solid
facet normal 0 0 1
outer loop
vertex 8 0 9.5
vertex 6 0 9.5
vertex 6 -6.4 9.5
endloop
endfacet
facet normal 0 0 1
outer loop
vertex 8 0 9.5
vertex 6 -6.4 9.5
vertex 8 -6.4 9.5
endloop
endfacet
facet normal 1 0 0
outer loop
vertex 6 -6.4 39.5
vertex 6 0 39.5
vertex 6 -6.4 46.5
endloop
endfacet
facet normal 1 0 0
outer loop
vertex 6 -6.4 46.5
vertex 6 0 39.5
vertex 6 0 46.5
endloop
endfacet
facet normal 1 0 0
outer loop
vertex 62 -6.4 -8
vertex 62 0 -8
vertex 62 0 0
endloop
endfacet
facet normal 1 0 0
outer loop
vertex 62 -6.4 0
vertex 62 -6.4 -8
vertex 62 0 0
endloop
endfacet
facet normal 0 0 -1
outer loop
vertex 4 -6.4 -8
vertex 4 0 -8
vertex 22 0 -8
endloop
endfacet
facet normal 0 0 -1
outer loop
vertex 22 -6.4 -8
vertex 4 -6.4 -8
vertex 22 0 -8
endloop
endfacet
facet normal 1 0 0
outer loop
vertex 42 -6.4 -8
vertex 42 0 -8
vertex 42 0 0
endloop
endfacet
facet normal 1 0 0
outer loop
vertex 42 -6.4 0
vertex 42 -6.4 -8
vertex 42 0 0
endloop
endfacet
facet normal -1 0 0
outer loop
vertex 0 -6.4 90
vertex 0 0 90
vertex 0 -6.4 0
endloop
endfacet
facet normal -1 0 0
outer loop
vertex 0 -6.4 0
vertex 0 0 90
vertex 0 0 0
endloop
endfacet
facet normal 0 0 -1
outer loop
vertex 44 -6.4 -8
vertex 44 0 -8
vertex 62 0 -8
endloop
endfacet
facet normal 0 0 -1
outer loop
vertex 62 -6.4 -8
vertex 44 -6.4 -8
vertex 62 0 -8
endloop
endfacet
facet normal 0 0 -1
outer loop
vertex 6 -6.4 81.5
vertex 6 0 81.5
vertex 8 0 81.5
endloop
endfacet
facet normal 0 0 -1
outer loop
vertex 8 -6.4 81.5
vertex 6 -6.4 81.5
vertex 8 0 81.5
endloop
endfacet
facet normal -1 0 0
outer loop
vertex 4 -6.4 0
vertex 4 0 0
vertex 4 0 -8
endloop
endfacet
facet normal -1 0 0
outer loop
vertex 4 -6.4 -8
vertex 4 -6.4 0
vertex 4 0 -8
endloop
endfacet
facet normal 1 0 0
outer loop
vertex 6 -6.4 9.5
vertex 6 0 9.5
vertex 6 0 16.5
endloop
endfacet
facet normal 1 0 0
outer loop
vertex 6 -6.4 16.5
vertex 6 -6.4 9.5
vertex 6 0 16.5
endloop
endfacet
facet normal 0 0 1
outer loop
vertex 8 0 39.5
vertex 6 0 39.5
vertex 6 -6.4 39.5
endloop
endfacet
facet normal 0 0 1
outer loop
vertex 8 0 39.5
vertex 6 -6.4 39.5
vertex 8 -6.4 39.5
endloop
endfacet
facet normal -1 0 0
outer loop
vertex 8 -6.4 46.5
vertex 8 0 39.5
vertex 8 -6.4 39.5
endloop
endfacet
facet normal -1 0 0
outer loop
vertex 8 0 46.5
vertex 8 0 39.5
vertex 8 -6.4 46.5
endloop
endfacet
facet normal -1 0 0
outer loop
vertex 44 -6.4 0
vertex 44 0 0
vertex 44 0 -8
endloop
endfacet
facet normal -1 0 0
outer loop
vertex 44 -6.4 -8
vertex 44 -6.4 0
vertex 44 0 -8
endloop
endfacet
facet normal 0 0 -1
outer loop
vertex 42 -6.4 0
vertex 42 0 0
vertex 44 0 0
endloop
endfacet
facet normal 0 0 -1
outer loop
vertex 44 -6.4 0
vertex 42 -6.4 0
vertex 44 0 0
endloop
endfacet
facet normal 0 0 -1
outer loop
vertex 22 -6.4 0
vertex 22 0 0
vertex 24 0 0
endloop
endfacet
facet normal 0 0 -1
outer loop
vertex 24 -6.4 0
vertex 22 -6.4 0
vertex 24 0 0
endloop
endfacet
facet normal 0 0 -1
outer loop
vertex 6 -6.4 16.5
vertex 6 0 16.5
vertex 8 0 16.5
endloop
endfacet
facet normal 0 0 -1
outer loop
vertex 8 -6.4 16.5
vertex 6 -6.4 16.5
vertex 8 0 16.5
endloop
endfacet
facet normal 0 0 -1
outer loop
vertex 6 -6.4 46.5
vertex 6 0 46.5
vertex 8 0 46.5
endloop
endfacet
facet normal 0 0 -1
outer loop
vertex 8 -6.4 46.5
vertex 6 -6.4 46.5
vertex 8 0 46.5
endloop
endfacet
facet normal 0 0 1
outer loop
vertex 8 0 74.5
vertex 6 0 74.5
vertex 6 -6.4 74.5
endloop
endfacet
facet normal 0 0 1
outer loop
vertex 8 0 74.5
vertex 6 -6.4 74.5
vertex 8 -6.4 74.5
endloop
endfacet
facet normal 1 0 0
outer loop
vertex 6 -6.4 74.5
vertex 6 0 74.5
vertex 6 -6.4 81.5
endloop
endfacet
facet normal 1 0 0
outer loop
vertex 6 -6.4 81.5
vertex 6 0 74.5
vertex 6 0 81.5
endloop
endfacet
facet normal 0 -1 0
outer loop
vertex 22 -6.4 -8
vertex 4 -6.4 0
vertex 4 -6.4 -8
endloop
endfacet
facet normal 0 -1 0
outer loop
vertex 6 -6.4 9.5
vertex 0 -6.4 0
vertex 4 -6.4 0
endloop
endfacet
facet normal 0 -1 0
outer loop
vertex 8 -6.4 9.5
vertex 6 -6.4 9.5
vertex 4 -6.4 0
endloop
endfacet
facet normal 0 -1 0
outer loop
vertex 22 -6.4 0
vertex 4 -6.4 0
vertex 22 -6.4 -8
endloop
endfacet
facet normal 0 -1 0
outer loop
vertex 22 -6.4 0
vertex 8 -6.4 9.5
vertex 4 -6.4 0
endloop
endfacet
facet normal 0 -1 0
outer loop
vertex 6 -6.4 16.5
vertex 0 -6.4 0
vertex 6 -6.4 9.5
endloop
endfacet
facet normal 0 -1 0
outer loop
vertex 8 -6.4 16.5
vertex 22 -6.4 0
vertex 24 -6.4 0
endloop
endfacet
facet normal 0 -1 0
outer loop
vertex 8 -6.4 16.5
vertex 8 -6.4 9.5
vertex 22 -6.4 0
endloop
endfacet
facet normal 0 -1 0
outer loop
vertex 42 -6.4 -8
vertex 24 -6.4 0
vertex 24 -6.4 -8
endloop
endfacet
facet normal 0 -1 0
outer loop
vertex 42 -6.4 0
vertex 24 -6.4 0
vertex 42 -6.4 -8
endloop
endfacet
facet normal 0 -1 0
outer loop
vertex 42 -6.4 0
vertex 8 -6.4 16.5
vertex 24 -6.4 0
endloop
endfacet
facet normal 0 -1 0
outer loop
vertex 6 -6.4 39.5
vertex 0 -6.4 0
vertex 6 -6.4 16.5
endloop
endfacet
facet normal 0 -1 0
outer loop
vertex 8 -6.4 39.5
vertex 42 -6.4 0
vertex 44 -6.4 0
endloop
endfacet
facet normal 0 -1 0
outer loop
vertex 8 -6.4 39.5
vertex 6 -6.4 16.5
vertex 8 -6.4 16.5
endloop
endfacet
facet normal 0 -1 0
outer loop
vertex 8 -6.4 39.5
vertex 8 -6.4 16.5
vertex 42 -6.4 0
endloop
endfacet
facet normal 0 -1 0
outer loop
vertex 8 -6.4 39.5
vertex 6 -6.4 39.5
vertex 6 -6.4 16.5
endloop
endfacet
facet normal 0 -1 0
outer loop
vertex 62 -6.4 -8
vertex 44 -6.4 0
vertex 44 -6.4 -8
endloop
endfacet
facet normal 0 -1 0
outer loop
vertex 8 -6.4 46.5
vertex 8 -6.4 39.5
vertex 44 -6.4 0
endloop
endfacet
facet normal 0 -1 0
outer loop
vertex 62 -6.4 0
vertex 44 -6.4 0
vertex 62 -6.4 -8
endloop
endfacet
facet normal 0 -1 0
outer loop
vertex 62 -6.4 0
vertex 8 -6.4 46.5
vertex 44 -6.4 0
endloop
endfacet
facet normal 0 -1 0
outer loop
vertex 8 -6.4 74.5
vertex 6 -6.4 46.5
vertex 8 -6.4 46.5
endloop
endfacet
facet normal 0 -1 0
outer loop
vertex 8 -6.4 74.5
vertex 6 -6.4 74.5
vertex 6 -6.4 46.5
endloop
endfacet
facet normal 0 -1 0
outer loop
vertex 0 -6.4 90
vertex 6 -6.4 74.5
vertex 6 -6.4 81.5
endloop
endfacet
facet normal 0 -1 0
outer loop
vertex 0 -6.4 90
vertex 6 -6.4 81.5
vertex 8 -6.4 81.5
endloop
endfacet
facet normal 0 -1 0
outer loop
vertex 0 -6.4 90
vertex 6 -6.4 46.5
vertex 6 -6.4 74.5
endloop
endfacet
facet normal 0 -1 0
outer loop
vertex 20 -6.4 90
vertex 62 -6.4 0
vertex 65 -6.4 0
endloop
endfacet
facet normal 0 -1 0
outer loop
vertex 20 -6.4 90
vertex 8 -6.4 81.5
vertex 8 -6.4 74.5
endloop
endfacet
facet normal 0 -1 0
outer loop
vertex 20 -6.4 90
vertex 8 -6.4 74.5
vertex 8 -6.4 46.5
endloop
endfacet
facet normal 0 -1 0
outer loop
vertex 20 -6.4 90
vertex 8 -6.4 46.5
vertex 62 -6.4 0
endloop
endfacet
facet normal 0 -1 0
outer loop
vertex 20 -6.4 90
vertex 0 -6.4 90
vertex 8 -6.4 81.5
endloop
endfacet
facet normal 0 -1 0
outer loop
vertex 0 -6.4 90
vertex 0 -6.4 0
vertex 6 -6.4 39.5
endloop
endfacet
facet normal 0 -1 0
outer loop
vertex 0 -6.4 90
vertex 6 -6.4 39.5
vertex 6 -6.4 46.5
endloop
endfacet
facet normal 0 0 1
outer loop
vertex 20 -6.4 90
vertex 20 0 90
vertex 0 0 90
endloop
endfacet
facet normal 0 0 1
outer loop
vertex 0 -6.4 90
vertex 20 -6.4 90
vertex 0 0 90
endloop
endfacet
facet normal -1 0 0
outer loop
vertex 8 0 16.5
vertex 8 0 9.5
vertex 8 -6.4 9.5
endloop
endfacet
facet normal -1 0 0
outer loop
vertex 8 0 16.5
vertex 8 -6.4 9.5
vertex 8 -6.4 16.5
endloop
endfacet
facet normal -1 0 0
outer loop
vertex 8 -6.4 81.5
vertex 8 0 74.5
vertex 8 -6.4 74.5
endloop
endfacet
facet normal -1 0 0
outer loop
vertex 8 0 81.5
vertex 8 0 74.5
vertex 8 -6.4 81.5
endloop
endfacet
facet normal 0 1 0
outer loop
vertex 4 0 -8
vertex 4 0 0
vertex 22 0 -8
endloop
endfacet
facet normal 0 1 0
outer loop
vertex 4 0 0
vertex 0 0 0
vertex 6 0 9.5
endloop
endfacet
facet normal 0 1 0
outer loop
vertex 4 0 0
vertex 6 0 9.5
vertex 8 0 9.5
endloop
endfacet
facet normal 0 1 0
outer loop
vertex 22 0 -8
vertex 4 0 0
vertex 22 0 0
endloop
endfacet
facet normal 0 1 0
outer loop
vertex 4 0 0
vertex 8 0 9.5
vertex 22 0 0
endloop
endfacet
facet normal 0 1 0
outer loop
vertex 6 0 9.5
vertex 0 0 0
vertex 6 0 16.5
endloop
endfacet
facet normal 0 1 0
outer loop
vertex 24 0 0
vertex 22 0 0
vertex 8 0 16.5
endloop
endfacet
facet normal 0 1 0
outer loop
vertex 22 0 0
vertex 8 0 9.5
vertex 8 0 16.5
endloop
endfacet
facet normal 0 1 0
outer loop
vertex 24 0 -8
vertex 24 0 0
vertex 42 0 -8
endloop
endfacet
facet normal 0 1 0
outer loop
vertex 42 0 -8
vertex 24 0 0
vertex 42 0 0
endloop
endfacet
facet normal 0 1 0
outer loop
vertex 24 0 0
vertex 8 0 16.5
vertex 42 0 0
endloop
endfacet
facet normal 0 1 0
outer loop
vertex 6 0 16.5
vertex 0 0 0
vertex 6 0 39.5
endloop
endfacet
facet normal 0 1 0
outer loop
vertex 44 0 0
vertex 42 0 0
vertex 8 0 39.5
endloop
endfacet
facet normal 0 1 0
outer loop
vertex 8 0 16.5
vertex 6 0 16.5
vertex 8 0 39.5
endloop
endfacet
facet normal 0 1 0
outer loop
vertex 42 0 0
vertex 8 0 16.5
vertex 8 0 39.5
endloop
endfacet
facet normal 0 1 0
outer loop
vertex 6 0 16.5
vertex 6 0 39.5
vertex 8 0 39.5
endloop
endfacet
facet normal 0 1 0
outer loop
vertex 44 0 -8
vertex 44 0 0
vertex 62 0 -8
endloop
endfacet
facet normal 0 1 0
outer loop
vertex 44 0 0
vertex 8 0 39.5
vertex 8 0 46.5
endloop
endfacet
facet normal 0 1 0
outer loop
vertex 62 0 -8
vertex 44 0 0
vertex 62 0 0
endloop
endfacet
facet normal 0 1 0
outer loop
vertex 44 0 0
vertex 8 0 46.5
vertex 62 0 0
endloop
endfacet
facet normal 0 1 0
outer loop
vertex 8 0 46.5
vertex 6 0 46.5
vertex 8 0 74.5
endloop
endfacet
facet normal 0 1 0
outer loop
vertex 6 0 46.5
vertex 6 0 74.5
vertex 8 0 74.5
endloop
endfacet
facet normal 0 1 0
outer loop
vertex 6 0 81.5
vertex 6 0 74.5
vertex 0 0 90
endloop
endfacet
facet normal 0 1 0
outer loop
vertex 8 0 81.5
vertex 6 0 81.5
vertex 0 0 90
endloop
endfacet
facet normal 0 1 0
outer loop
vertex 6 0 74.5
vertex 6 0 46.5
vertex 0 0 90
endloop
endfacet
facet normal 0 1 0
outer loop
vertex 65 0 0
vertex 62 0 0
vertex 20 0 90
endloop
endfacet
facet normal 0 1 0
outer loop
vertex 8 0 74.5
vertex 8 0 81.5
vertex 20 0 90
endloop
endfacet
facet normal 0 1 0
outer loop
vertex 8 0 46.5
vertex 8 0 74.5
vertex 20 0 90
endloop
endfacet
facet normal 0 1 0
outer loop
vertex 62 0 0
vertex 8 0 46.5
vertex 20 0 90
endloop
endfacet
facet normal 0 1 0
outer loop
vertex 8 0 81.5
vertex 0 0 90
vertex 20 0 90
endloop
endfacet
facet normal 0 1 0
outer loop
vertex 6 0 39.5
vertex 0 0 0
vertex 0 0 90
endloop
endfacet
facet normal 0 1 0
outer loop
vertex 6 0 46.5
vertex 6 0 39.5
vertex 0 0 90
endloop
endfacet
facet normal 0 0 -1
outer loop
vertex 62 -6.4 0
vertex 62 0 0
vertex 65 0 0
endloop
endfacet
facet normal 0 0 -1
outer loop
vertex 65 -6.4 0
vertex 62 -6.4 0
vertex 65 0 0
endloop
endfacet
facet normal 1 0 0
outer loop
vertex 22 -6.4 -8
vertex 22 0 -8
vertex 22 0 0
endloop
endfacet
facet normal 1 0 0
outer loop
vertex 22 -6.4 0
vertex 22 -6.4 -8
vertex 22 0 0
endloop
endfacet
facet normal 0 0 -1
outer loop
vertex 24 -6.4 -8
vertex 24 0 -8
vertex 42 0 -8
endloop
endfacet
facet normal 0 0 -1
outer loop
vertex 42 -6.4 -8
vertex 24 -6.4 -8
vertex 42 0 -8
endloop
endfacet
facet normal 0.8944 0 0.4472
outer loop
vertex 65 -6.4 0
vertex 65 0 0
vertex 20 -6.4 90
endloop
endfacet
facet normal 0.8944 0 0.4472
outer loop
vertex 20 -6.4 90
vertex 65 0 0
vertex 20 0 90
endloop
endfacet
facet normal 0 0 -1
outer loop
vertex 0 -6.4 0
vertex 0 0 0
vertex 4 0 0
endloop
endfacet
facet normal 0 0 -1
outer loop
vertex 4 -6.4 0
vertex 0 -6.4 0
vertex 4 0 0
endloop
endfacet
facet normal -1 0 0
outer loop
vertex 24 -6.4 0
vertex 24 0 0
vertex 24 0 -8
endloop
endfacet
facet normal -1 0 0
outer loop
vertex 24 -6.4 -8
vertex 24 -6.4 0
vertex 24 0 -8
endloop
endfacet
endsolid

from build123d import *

# Parameters (mm, degrees)
F0_W     = 2
F0_H     = 7
F1_DEPTH = 6.4


with BuildPart() as f1:
    # F0 (on Front) → F1 (new body)
    with BuildSketch(Plane.XZ):
        Polygon((0, 90), (0, 0), (4, 0), (4, -8), (22, -8), (22, 0), (24, 0), (24, -8), (42, -8), (42, 0), (44, 0), (44, -8), (62, -8), (62, 0), (65, 0), (20, 90), align=None)
        with Locations((7, 13)):
            Rectangle(F0_W, F0_H, mode=Mode.SUBTRACT)
        with Locations((7, 43)):
            Rectangle(F0_W, F0_H, mode=Mode.SUBTRACT)
        with Locations((7, 78)):
            Rectangle(F0_W, F0_H, mode=Mode.SUBTRACT)
    extrude(amount=F1_DEPTH)


solid = f1.part
